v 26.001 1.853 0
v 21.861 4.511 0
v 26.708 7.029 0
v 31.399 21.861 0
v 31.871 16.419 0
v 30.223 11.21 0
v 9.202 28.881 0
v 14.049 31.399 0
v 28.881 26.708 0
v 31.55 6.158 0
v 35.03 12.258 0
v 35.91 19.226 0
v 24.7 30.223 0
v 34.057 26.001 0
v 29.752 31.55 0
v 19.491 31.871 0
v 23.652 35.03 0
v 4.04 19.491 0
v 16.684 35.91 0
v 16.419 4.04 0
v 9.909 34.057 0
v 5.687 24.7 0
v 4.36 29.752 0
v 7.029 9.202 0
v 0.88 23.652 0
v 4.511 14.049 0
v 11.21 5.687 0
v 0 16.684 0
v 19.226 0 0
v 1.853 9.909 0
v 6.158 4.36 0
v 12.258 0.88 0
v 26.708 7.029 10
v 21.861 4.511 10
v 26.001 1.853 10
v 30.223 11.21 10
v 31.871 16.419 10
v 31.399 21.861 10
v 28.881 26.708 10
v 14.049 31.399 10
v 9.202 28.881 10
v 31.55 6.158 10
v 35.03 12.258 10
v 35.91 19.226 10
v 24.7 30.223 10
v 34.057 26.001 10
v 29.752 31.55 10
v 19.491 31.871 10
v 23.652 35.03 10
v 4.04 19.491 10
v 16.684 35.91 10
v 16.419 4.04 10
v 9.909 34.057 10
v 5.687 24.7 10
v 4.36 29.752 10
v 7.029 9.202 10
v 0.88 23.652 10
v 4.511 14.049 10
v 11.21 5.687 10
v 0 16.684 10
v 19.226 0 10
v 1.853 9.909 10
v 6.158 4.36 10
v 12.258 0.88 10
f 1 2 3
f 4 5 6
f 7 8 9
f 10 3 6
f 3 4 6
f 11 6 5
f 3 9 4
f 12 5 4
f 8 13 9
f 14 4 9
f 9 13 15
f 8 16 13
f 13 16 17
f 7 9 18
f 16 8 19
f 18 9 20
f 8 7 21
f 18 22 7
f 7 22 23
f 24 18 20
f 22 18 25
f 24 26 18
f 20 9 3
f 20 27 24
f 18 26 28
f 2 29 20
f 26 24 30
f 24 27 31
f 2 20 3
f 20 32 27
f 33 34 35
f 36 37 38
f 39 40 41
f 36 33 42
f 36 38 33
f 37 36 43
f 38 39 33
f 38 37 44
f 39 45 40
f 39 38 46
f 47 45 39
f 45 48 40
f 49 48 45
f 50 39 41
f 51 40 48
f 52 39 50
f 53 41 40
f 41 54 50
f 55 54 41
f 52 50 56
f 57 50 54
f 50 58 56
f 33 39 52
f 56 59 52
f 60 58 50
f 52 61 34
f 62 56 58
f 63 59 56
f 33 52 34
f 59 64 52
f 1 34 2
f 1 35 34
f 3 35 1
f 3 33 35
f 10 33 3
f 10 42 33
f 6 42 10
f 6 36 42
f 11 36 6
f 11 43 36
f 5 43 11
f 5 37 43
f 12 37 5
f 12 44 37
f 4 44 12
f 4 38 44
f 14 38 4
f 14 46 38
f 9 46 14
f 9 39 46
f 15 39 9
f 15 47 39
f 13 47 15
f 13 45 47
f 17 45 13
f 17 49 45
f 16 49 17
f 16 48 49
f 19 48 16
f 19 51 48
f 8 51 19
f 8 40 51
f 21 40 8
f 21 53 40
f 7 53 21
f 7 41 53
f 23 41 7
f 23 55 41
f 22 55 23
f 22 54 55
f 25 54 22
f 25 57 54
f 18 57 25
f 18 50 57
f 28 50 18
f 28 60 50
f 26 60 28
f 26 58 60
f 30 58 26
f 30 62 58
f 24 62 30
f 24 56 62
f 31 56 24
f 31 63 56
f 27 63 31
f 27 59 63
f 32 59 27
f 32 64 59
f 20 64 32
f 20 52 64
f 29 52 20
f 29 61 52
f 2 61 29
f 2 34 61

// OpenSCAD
$fn = 32;

// ----------------------------------------------------------------------
// Chain sprocket: 16 teeth, 14 mm root radius
// ----------------------------------------------------------------------

// --- parameters (mm) ---
profile_height = 10;      // extrusion height
profile_points = 32;      // points of the closed outline

profile = [[31.871, 16.419], [35.91, 19.226], [31.399, 21.861], [34.057, 26.001], [28.881, 26.708], [29.752, 31.55], [24.7, 30.223], [23.652, 35.03], [19.491, 31.871], [16.684, 35.91], [14.049, 31.399], [9.909, 34.057], [9.202, 28.881], [4.36, 29.752], [5.687, 24.7], [0.88, 23.652], [4.04, 19.491], [0, 16.684], [4.511, 14.049], [1.853, 9.909], [7.029, 9.202], [6.158, 4.36], [11.21, 5.687], [12.258, 0.88], [16.419, 4.04], [19.226, 0], [21.861, 4.511], [26.001, 1.853], [26.708, 7.029], [31.55, 6.158], [30.223, 11.21], [35.03, 12.258]];  // single closed polygon, 32 points, counter clockwise

// --- the one profile operation ---
linear_extrude(height = profile_height) polygon(points = profile);
